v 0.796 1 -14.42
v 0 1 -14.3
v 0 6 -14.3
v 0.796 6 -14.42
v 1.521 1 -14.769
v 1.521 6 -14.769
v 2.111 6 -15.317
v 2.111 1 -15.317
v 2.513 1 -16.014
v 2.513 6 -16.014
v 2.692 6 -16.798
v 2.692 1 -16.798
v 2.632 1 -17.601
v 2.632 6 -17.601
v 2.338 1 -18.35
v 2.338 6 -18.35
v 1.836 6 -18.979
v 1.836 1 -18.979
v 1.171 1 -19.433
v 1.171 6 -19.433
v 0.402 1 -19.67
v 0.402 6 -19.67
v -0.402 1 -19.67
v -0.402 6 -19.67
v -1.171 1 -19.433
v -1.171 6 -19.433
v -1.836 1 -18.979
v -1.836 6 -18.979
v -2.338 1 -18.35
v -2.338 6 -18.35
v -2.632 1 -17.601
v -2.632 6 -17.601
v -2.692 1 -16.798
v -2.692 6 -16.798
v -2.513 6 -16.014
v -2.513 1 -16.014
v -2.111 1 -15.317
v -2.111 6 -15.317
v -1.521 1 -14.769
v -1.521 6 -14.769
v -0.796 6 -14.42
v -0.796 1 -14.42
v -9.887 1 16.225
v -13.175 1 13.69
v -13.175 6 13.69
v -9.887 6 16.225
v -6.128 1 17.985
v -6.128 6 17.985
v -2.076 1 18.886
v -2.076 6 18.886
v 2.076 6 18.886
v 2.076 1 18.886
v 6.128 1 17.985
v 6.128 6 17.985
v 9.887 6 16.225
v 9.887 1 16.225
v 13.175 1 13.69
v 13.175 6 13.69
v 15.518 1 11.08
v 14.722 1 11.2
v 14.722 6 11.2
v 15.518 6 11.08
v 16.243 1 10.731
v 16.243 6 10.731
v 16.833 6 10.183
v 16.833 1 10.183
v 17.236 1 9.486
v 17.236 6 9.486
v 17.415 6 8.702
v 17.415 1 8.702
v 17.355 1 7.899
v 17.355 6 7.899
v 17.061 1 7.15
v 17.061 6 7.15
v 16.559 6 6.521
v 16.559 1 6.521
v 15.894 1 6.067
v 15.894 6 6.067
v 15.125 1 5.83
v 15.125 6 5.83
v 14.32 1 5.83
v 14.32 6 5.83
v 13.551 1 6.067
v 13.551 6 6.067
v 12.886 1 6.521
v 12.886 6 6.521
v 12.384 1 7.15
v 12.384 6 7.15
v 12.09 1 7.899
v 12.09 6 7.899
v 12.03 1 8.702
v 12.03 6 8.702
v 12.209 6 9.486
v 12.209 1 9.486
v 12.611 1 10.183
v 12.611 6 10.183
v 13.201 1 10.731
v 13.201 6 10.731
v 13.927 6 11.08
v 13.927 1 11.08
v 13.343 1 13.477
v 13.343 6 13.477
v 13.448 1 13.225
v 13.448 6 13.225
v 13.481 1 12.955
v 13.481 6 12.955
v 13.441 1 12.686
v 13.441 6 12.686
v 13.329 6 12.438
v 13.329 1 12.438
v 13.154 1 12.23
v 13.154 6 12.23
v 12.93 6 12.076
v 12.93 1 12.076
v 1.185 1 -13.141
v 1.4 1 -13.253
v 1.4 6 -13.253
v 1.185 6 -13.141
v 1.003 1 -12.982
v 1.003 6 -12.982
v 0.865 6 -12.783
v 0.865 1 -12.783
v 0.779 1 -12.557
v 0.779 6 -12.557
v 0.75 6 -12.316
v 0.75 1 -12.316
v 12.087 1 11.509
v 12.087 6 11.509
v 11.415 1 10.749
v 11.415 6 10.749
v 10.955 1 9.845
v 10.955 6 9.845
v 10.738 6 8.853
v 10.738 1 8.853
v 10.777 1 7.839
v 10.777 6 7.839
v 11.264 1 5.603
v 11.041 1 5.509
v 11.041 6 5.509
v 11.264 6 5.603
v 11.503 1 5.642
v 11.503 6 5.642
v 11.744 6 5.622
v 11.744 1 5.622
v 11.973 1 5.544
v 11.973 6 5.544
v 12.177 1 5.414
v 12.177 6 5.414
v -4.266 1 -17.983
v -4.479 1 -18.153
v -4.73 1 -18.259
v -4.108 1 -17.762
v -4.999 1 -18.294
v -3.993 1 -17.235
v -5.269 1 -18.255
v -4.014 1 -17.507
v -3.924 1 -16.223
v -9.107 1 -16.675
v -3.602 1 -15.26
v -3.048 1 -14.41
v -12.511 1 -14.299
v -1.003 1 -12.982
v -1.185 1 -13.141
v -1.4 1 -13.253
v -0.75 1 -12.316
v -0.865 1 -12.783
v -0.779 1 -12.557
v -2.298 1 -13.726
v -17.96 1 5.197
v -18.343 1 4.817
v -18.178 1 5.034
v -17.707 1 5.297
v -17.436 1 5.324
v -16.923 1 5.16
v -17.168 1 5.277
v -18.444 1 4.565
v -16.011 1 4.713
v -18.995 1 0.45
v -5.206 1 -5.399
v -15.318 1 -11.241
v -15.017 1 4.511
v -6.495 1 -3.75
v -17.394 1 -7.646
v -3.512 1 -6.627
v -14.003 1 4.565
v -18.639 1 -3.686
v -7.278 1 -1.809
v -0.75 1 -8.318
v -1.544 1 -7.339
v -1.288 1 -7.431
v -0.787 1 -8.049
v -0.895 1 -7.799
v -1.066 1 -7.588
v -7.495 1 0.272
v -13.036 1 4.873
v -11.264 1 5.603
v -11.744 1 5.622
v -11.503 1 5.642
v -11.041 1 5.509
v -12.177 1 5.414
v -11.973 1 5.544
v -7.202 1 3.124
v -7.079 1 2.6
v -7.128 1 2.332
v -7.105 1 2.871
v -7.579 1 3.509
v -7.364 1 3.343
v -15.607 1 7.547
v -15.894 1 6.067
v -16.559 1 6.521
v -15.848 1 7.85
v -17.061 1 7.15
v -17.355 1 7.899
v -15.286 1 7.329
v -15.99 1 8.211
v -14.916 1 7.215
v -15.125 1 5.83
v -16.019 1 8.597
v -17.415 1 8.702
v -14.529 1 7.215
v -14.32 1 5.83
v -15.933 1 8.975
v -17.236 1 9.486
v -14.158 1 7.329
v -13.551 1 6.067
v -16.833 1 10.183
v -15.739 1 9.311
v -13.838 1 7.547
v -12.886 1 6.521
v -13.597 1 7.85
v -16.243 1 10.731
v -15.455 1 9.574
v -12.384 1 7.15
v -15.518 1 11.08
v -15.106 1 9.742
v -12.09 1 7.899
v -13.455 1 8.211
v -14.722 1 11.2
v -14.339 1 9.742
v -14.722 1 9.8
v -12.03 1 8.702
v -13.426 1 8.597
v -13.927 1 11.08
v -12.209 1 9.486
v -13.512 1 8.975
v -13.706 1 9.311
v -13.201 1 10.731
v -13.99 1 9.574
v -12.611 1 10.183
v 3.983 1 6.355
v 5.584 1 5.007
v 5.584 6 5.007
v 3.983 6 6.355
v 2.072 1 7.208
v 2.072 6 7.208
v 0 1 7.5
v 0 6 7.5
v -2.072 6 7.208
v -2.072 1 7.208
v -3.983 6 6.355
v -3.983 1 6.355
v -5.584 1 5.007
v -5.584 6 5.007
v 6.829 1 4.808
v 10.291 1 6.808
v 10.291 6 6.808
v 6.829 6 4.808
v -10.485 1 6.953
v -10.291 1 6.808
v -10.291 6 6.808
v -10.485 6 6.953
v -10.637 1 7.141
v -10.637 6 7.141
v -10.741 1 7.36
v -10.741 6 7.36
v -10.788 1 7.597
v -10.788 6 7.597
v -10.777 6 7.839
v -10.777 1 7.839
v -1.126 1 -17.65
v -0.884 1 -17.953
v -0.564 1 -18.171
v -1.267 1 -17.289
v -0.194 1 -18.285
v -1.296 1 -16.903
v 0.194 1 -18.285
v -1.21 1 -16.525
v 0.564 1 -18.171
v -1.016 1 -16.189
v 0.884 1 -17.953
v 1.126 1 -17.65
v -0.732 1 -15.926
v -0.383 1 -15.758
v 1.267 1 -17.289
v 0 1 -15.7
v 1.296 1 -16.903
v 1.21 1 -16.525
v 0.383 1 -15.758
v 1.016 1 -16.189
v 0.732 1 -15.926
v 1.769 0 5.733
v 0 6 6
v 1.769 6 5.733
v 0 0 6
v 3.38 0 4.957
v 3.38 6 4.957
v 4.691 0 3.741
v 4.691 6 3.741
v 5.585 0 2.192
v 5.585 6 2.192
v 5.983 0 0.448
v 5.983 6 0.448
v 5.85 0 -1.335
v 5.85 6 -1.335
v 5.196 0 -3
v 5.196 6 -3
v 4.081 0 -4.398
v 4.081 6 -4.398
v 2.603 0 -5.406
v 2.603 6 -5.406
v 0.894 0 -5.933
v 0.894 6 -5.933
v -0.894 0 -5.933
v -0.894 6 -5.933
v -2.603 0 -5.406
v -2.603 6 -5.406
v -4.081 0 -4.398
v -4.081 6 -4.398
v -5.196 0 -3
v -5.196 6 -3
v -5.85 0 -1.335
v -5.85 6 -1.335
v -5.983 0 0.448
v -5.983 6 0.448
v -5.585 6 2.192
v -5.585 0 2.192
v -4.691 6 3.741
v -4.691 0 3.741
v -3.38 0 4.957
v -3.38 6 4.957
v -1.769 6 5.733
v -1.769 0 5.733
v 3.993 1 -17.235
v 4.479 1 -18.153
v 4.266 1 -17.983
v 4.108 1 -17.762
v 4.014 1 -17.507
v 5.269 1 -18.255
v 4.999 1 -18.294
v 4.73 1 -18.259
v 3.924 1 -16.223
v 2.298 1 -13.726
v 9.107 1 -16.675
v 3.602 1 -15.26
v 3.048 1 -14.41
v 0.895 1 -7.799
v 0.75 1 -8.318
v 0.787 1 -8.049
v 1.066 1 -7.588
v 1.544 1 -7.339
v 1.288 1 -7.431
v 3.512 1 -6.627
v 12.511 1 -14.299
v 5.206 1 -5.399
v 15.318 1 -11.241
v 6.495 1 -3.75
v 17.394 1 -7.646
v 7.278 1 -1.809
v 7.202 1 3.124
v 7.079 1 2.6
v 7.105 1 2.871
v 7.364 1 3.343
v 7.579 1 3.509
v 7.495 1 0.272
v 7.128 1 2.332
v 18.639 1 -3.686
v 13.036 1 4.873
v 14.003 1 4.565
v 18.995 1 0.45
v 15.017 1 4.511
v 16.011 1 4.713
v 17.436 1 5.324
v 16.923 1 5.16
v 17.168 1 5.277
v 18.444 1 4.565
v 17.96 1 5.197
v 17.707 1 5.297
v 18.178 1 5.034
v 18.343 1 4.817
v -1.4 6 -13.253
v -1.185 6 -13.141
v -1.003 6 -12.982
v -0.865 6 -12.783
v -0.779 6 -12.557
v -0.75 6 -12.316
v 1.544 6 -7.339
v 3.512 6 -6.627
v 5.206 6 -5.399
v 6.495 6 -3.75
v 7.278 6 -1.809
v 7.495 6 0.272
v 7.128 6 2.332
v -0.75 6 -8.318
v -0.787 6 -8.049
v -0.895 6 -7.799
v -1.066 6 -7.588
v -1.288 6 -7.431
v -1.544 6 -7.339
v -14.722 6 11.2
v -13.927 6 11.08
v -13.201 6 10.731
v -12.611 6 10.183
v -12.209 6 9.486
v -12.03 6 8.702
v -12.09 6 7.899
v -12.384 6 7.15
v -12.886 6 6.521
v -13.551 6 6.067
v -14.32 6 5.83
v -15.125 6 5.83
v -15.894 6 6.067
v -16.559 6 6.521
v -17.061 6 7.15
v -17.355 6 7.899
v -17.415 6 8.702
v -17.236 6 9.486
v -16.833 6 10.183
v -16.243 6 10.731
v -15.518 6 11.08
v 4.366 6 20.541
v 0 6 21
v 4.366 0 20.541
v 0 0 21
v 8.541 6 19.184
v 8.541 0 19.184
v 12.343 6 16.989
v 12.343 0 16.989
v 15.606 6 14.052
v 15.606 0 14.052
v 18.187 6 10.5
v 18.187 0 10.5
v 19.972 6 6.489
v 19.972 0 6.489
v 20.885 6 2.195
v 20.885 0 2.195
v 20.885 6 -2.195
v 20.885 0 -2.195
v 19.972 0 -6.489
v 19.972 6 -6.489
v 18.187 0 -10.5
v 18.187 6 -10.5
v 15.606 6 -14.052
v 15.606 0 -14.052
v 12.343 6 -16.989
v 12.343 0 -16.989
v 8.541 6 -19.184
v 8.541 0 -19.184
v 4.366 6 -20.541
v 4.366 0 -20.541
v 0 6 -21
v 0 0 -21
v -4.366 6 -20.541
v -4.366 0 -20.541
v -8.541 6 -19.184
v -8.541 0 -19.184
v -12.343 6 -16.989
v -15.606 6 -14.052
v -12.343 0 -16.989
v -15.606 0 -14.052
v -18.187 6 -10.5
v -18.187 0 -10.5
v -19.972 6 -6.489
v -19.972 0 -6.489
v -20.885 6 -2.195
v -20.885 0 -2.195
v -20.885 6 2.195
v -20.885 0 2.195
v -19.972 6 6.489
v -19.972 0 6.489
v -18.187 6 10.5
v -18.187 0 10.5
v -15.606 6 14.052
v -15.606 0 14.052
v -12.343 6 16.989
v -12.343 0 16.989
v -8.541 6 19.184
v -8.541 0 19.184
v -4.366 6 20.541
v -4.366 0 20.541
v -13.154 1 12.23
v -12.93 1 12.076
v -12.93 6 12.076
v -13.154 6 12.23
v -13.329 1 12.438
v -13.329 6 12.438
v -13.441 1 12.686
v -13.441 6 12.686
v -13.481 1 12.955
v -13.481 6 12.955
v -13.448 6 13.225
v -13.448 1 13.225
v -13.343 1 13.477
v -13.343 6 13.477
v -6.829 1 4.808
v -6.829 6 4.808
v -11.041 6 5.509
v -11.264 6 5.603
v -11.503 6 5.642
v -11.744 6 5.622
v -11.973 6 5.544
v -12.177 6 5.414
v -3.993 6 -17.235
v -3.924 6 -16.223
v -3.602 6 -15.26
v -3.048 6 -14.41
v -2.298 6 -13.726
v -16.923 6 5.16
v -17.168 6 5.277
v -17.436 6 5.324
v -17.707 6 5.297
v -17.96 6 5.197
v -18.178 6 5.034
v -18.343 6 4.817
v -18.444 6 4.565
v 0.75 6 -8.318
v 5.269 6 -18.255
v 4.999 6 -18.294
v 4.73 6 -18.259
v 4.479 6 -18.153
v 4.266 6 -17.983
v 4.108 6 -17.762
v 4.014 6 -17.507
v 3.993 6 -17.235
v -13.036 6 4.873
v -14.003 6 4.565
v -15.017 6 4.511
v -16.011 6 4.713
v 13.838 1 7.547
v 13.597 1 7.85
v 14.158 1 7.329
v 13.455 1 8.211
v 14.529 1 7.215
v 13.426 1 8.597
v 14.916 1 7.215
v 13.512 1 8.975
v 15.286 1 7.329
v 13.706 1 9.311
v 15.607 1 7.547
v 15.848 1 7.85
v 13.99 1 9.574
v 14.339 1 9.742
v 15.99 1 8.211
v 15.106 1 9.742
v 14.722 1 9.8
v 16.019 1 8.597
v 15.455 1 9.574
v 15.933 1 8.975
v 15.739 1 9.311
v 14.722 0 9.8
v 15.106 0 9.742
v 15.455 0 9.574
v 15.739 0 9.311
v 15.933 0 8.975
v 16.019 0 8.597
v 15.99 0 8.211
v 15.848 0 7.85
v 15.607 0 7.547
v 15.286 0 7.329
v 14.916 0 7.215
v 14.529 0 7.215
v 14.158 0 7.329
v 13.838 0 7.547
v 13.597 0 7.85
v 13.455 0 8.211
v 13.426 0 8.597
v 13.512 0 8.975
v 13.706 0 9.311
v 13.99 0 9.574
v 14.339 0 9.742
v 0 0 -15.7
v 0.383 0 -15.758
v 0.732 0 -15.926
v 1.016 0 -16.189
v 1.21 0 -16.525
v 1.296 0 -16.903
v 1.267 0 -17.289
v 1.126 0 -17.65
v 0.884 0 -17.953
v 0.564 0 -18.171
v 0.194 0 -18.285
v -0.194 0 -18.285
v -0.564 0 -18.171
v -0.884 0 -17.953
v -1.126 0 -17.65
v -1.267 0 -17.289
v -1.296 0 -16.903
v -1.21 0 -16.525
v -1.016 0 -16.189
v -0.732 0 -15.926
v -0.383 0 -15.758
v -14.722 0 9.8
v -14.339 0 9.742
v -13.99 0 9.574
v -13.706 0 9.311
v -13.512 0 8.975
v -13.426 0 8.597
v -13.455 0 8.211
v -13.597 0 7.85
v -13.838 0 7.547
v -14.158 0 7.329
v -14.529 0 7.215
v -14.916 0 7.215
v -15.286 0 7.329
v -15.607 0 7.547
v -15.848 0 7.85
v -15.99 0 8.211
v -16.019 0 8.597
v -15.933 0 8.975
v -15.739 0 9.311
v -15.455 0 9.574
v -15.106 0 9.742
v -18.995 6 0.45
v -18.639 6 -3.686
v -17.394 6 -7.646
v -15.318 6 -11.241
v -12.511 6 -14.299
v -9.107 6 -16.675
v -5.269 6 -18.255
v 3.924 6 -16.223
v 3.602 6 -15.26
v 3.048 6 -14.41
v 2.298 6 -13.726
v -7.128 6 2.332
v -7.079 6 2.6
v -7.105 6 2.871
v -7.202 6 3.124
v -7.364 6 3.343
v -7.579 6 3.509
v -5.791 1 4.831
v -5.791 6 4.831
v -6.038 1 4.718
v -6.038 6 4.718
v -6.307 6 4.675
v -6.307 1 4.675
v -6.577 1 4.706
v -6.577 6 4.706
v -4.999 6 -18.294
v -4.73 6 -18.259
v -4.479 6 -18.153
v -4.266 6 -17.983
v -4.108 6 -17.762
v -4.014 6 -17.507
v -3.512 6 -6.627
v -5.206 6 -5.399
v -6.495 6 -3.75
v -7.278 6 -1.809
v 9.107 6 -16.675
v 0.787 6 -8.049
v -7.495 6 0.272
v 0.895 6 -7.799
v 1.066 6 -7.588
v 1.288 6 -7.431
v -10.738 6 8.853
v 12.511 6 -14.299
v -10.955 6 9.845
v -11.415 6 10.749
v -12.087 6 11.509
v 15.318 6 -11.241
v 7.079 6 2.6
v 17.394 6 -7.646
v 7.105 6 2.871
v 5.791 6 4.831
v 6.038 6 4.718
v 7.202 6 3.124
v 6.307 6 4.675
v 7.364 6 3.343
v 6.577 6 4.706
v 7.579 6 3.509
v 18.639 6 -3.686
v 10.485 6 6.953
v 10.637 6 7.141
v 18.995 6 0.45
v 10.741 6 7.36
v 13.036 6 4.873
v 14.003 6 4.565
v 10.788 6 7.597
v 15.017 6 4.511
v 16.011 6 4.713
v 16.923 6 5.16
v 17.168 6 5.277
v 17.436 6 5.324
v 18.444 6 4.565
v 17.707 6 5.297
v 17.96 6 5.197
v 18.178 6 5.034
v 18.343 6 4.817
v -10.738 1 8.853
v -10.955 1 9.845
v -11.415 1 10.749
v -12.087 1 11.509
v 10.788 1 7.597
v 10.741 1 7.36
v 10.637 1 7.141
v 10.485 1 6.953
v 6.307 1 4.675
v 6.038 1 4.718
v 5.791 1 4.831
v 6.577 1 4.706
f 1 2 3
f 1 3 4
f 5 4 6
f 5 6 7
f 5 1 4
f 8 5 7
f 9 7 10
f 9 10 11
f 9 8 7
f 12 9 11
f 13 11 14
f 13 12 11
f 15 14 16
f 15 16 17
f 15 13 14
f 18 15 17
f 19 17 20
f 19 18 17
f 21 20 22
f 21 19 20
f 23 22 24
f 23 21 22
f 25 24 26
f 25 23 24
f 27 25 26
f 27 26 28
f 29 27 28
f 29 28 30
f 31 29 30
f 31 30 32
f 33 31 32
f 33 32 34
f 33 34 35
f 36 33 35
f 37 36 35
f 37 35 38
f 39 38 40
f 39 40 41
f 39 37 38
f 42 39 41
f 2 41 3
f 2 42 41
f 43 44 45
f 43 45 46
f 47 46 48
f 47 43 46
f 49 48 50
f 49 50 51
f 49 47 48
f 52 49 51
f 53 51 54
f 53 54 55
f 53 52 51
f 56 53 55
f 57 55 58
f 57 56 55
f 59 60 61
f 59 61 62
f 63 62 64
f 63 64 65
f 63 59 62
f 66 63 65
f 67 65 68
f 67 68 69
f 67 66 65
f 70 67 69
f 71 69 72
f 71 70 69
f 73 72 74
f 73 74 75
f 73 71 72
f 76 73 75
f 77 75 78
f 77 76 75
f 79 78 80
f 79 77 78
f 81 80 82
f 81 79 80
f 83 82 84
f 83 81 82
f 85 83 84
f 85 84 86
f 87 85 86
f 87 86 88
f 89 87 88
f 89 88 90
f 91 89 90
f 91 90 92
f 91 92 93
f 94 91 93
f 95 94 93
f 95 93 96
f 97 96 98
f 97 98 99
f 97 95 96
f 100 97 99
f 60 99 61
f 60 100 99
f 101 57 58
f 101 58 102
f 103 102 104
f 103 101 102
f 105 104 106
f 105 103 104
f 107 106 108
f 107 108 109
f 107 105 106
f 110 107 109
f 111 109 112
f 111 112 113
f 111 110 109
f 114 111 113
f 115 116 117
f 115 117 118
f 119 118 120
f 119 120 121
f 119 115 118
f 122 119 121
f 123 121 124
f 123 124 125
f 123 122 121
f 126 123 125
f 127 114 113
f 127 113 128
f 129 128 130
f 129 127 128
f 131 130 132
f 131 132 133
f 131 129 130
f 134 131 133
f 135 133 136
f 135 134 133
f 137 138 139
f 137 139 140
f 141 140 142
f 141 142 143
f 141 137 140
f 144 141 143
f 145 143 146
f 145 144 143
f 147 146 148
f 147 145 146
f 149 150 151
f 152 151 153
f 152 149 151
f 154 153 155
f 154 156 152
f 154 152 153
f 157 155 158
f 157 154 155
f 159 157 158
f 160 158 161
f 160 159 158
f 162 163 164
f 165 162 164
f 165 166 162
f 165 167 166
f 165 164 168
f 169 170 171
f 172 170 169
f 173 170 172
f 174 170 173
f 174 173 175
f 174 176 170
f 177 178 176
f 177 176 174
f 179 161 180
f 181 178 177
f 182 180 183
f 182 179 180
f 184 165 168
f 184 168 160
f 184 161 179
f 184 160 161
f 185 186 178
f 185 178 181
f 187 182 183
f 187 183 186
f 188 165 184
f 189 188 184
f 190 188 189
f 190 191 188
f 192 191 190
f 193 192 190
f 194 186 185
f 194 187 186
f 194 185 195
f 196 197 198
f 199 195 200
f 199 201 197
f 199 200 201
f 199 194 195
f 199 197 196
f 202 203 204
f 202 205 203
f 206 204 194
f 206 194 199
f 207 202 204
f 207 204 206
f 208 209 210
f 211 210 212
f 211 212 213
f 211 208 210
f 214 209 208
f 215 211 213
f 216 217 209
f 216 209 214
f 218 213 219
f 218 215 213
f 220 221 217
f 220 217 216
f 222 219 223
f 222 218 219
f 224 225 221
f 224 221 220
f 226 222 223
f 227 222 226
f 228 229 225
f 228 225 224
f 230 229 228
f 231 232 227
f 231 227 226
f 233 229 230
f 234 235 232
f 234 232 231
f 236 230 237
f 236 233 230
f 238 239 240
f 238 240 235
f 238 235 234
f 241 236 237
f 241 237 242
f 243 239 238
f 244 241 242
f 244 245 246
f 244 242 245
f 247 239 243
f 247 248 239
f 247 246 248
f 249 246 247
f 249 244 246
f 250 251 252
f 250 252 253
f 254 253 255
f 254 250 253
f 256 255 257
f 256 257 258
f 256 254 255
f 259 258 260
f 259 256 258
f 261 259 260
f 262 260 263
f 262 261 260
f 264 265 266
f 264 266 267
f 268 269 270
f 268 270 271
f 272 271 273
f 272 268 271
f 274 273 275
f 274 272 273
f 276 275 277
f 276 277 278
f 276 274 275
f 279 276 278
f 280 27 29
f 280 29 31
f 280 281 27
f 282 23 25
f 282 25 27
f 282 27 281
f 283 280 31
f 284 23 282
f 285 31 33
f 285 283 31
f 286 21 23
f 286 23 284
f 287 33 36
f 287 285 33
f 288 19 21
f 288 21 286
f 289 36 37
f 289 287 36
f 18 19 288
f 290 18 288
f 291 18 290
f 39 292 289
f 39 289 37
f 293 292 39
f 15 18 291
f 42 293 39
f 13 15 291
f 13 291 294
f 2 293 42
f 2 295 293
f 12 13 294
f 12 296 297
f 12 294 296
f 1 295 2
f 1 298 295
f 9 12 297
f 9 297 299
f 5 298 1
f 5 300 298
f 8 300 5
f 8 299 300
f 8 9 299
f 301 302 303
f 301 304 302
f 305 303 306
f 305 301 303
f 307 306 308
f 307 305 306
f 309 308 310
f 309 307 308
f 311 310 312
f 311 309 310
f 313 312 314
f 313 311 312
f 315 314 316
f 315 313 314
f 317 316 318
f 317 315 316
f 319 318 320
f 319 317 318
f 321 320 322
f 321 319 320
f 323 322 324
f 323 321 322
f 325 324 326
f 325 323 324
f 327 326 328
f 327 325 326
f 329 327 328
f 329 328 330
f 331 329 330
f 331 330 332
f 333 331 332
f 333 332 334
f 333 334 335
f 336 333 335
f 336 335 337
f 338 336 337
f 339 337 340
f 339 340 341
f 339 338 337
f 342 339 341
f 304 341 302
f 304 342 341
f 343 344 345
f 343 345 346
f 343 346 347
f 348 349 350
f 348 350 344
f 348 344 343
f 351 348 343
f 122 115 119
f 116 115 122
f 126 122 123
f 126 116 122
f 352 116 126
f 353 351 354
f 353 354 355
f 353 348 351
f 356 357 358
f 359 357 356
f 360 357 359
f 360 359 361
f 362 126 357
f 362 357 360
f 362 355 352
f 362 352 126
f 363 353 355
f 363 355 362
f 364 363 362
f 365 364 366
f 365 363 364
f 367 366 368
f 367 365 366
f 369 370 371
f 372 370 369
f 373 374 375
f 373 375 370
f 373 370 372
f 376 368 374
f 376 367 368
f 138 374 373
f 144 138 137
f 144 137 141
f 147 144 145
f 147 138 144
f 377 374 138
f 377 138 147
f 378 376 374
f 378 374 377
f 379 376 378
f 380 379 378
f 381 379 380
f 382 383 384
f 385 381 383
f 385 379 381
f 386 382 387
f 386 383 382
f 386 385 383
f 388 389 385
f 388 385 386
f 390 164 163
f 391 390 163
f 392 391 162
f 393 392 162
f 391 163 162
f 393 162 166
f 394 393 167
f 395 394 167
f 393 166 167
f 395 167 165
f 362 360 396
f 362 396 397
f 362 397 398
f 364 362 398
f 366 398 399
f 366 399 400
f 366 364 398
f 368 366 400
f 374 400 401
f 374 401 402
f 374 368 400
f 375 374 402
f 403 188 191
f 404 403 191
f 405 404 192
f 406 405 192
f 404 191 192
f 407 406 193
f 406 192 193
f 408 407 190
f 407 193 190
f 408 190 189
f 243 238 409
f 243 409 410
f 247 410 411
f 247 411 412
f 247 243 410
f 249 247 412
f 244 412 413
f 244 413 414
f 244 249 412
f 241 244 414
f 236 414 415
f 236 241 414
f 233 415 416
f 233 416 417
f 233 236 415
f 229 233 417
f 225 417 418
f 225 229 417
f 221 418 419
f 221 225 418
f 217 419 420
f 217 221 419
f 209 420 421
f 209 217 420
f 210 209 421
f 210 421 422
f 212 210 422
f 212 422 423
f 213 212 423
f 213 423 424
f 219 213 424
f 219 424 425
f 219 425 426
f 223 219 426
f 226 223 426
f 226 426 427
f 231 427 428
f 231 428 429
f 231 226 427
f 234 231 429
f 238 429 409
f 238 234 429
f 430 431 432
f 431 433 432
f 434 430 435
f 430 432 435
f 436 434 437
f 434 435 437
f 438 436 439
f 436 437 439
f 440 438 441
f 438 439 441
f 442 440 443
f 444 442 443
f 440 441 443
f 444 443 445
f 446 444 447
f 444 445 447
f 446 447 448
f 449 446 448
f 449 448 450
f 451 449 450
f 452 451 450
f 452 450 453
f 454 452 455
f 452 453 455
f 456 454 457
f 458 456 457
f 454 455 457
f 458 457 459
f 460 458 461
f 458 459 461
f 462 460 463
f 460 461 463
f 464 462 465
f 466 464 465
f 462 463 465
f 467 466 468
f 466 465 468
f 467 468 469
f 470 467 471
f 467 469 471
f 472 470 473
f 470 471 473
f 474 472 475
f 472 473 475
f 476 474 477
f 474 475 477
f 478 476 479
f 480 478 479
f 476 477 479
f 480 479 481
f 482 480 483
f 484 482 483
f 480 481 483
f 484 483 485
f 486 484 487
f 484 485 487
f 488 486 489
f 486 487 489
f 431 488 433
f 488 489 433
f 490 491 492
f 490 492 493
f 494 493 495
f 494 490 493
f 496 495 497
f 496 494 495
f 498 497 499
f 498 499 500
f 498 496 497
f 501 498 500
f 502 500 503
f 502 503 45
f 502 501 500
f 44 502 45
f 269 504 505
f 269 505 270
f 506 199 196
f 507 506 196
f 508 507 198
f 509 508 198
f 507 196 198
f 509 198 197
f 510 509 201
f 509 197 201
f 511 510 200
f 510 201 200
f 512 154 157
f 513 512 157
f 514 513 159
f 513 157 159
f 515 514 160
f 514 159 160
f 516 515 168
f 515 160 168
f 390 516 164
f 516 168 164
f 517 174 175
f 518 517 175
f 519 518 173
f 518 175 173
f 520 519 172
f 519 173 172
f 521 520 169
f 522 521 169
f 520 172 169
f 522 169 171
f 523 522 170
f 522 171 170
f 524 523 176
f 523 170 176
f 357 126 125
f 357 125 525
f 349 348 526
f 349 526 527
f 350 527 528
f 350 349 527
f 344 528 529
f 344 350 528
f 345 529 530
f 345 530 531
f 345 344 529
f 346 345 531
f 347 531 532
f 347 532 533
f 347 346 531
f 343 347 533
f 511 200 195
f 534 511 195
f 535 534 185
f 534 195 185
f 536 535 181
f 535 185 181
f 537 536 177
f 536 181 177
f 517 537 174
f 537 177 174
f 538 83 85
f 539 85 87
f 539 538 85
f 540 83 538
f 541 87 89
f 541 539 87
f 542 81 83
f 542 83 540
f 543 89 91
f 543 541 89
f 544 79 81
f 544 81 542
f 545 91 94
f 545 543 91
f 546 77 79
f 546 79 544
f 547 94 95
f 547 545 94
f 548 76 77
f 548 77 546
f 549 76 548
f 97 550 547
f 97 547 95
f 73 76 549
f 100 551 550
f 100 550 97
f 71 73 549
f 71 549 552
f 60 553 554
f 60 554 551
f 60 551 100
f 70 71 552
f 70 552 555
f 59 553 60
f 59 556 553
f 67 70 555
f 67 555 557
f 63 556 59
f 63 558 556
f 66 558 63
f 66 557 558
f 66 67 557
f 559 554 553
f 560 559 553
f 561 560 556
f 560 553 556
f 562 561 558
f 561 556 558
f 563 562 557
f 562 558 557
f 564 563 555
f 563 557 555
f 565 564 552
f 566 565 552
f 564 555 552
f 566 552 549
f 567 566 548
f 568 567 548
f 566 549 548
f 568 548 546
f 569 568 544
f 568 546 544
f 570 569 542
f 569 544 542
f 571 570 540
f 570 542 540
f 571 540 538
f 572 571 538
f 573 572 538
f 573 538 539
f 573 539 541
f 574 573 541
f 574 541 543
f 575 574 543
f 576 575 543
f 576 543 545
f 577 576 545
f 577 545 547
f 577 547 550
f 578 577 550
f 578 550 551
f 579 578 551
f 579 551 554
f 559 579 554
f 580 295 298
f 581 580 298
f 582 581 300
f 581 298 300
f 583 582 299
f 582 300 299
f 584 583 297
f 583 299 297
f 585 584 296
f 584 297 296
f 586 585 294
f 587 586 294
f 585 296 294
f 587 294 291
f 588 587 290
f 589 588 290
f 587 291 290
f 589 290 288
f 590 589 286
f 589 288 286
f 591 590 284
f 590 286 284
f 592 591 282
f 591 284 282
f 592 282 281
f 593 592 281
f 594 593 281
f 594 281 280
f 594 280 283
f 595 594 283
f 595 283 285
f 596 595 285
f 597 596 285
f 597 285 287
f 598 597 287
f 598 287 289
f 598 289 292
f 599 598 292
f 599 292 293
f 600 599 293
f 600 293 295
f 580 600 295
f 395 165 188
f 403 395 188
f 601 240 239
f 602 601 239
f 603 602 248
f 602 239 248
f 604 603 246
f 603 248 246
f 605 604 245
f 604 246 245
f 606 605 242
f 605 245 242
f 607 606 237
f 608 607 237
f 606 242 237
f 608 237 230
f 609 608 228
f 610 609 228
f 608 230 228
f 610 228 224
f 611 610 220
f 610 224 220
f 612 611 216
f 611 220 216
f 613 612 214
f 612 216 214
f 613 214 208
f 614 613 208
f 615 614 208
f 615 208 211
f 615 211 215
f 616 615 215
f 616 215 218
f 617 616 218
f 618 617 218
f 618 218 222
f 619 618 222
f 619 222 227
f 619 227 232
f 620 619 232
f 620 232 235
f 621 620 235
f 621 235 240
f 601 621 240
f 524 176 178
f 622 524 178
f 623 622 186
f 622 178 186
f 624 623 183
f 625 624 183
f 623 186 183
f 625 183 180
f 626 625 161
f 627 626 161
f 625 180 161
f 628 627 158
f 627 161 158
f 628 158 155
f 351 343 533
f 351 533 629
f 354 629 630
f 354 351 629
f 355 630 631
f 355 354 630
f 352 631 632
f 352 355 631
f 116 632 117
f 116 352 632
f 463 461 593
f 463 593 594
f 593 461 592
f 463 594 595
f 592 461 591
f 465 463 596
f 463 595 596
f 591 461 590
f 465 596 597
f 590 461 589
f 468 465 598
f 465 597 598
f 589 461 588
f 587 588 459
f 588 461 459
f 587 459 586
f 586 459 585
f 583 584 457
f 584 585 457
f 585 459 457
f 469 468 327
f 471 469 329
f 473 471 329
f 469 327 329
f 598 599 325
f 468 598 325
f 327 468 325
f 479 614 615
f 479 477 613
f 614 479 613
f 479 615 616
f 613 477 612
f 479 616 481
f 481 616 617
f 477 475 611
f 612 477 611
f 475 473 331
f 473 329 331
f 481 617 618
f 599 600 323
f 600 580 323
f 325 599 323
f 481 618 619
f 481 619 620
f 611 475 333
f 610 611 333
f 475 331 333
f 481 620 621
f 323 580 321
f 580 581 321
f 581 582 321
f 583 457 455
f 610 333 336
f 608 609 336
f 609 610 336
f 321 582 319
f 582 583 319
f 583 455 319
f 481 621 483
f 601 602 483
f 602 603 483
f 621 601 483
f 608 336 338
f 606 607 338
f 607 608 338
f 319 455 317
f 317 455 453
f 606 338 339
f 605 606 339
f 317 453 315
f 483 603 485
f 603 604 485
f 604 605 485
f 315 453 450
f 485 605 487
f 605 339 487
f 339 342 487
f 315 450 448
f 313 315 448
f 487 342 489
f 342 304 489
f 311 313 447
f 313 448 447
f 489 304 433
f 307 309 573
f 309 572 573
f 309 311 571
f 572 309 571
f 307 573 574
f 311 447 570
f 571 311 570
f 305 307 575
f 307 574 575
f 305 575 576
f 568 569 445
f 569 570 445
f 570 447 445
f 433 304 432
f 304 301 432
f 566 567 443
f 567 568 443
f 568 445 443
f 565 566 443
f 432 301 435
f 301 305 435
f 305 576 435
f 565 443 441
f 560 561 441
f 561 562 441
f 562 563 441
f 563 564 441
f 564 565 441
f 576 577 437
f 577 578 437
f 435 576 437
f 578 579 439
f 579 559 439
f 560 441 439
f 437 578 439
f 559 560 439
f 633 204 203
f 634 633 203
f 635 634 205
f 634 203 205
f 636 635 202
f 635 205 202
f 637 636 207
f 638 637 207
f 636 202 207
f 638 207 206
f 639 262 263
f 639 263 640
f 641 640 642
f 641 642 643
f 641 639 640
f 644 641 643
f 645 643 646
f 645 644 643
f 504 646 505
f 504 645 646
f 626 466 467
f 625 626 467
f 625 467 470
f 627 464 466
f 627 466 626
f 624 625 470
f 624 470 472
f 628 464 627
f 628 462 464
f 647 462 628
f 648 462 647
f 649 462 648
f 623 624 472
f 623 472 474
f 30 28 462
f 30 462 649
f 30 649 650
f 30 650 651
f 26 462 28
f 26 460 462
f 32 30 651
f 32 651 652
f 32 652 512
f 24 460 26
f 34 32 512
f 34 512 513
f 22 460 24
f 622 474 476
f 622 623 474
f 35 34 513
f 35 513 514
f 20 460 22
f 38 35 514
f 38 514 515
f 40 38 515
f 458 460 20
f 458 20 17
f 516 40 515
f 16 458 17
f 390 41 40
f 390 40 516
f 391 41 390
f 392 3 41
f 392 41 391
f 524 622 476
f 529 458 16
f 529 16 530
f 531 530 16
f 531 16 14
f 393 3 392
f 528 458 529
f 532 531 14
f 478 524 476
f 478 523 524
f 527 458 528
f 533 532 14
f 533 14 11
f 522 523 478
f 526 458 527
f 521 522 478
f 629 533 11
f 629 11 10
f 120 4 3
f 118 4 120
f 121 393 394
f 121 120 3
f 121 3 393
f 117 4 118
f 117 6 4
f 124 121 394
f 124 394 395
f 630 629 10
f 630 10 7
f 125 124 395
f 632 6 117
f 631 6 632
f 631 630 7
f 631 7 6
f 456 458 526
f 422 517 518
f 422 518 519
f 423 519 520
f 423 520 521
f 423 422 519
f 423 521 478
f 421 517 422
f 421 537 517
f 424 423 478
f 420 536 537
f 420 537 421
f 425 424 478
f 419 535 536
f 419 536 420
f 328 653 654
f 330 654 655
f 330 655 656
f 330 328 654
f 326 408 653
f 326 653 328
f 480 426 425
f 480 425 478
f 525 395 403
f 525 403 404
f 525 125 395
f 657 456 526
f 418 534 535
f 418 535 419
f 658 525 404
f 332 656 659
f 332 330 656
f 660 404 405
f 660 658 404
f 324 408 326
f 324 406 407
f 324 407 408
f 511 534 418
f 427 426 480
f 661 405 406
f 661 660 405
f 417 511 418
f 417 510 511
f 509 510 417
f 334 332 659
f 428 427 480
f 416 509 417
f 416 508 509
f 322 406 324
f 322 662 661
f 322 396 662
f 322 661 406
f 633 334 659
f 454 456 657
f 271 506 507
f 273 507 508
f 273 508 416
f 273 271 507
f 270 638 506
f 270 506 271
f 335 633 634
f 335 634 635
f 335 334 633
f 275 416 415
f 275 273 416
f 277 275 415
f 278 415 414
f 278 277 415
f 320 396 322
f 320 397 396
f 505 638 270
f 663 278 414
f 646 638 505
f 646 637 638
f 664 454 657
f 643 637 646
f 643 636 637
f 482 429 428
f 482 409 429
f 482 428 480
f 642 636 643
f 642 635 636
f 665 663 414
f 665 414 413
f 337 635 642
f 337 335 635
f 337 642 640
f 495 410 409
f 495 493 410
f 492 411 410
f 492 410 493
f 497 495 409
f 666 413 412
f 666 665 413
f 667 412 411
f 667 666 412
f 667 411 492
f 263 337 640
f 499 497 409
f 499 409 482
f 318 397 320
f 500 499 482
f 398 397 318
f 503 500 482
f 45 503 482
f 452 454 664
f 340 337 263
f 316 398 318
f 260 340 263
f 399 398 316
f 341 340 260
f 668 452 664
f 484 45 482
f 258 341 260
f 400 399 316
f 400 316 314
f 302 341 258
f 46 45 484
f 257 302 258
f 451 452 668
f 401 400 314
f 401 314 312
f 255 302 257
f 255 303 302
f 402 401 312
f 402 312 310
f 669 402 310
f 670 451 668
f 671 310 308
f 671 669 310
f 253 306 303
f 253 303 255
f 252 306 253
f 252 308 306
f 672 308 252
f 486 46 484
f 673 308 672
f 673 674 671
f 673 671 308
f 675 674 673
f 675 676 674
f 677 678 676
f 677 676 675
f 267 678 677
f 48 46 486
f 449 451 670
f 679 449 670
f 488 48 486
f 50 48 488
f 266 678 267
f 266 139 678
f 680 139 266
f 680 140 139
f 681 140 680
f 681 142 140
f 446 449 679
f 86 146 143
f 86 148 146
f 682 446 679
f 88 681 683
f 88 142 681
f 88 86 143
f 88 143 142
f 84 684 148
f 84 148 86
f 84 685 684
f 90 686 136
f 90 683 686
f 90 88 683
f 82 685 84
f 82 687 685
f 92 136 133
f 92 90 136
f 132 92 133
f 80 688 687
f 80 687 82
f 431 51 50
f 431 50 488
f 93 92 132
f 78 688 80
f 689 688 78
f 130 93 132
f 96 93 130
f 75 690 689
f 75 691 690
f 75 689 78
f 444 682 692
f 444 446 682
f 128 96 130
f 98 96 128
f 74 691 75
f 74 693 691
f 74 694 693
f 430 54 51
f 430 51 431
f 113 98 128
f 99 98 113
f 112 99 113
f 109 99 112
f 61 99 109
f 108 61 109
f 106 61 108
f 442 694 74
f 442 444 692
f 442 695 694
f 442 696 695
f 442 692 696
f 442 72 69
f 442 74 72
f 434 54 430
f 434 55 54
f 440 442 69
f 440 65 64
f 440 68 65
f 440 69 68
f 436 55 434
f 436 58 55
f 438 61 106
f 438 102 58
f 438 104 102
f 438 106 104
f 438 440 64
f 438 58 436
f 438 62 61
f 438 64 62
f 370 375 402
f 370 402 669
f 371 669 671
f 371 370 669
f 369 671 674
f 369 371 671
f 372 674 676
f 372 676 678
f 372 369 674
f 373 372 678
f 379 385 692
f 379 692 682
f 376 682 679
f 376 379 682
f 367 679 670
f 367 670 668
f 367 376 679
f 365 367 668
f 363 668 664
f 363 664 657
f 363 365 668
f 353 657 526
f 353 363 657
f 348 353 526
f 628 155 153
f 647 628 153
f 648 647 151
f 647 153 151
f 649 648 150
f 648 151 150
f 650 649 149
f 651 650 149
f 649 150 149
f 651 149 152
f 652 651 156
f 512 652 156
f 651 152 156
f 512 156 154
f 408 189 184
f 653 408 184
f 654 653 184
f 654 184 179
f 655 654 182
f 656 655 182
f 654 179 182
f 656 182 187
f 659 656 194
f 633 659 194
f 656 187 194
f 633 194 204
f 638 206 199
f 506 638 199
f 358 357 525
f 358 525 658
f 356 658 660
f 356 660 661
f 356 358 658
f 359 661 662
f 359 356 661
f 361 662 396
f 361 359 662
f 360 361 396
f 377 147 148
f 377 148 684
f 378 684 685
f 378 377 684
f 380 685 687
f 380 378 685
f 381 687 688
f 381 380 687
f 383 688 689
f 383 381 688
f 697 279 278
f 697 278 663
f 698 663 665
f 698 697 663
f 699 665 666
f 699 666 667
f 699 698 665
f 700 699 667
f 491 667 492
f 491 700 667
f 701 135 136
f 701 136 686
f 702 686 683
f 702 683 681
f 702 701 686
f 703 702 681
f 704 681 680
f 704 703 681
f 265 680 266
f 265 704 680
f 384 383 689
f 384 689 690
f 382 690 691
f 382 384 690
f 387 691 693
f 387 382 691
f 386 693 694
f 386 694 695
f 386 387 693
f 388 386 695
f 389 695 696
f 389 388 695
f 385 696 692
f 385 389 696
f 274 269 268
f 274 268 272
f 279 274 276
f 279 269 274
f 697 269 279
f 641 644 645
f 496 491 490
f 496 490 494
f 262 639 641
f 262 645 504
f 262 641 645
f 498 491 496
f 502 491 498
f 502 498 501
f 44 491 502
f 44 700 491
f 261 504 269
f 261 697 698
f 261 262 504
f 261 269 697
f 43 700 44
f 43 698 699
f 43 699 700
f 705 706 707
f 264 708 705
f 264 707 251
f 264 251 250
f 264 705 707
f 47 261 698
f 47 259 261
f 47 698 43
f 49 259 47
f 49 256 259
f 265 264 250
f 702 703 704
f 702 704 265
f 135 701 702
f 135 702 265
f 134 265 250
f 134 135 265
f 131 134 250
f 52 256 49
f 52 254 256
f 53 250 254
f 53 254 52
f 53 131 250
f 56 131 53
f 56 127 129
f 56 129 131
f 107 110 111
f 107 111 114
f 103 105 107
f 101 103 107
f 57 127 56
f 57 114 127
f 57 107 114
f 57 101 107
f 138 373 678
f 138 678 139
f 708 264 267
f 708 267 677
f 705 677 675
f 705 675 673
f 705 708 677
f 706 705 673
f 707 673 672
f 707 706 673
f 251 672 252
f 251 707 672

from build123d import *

# Parameters (mm, degrees)
SKETCH1_R           = 21
SKETCH1_R_2         = 6
BOSS_EXTRUDE1_DEPTH = 1
SKETCH2_R           = 21
SKETCH2_R_2         = 2.7
SKETCH2_R_3         = 6
BOSS_EXTRUDE2_DEPTH = 5
SKETCH3_R           = 1.3
CUT_EXTRUDE1_DEPTH  = 4


with BuildPart() as part:
    # Sketch1 → Boss-Extrude1 (new body)
    with BuildSketch(Plane(origin=(0, 0, 0), x_dir=(1, 0, 0), z_dir=(0, 1, 0))):
        with Locations(Location((0, 0, 0), (0, 0, 270))):
            Circle(SKETCH1_R)
        with Locations(Location((0, 0, 0), (0, 0, 270))):
            Circle(SKETCH1_R_2, mode=Mode.SUBTRACT)
    extrude(amount=BOSS_EXTRUDE1_DEPTH)

    # Sketch2 → Boss-Extrude2 (add)
    with BuildSketch(Plane(origin=(0, 1, 0), x_dir=(1, 0, 0), z_dir=(0, 1, 0))):
        with Locations(Location((0, 0, 0), (0, 0, 270))):
            Circle(SKETCH2_R)
        with Locations(Location((0, 17, 0), (0, 0, 270))):
            Circle(SKETCH2_R_2, mode=Mode.SUBTRACT)
        with Locations(Location((14.722431864, -8.5, 0), (0, 0, 270))):
            Circle(SKETCH2_R_2, mode=Mode.SUBTRACT)
        with Locations(Location((-14.722431864, -8.5, 0), (0, 0, 270))):
            Circle(SKETCH2_R_2, mode=Mode.SUBTRACT)
        with Locations(Location((0, 0, 0), (0, 0, 270))):
            Circle(SKETCH2_R_3, mode=Mode.SUBTRACT)
        with BuildLine():
            Line((-0.75, 12.316251501), (-0.75, 8.31790238))
            ThreePointArc((-0.75, 8.31790238), (-0.97350713, 7.687776342), (-1.544117647, 7.339325629))
            ThreePointArc((-1.544117647, 7.339325629), (-6.495190528, 3.75), (-7.128101265, -2.332417706))
            ThreePointArc((-7.128101265, -2.332417706), (-7.144563176, -3.000806265), (-7.578514767, -3.509432137))
            Line((-7.578514767, -3.509432137), (-11.041186679, -5.508606698))
            ThreePointArc((-11.041186679, -5.508606698), (-11.624105203, -5.639137624), (-12.177435716, -5.414065035))
            ThreePointArc((-12.177435716, -5.414065035), (-14.508194092, -4.505741348), (-16.922739342, -5.159543893))
            ThreePointArc((-16.922739342, -5.159543893), (-17.83709693, -5.255719057), (-18.443528223, -4.564675969))
            ThreePointArc((-18.443528223, -4.564675969), (-16.454482672, 9.5), (-5.268638762, 18.254901961))
            ThreePointArc((-5.268638762, 18.254901961), (-4.366962246, 18.075238599), (-3.993073588, 17.235294118))
            ThreePointArc((-3.993073588, 17.235294118), (-3.352010576, 14.817335321), (-1.4, 13.253001201))
            ThreePointArc((-1.4, 13.253001201), (-0.928416164, 12.886339214), (-0.75, 12.316251501))
        make_face(mode=Mode.SUBTRACT)
        with BuildLine():
            Line((0.75, 12.316251501), (0.75, 8.31790238))
            ThreePointArc((0.75, 8.31790238), (0.97350713, 7.687776342), (1.544117647, 7.339325629))
            ThreePointArc((1.544117647, 7.339325629), (6.495190528, 3.75), (7.128101265, -2.332417706))
            ThreePointArc((7.128101265, -2.332417706), (7.144563176, -3.000806265), (7.578514767, -3.509432137))
            Line((7.578514767, -3.509432137), (11.041186679, -5.508606698))
            ThreePointArc((11.041186679, -5.508606698), (11.624105203, -5.639137624), (12.177435716, -5.414065035))
            ThreePointArc((12.177435716, -5.414065035), (14.508194092, -4.505741348), (16.922739342, -5.159543893))
            ThreePointArc((16.922739342, -5.159543893), (17.83709693, -5.255719057), (18.443528223, -4.564675969))
            ThreePointArc((18.443528223, -4.564675969), (16.454482672, 9.5), (5.268638762, 18.254901961))
            ThreePointArc((5.268638762, 18.254901961), (4.366962246, 18.075238599), (3.993073588, 17.235294118))
            ThreePointArc((3.993073588, 17.235294118), (3.352010576, 14.817335321), (1.4, 13.253001201))
            ThreePointArc((1.4, 13.253001201), (0.928416164, 12.886339214), (0.75, 12.316251501))
        make_face(mode=Mode.SUBTRACT)
        with BuildLine():
            Line((10.291186679, -6.807644803), (6.828514767, -4.808470243))
            ThreePointArc((6.828514767, -4.808470243), (6.171056046, -4.686970077), (5.583983618, -5.006907923))
            ThreePointArc((5.583983618, -5.006907923), (0, -7.5), (-5.583983618, -5.006907923))
            ThreePointArc((-5.583983618, -5.006907923), (-6.171056046, -4.686970077), (-6.828514767, -4.808470243))
            Line((-6.828514767, -4.808470243), (-10.291186679, -6.807644803))
            ThreePointArc((-10.291186679, -6.807644803), (-10.695689039, -7.24720159), (-10.777435716, -7.838936166))
            ThreePointArc((-10.777435716, -7.838936166), (-11.156183517, -10.311593973), (-12.929665754, -12.075750225))
            ThreePointArc((-12.929665754, -12.075750225), (-13.470134683, -12.819519543), (-13.174889461, -13.690225991))
            ThreePointArc((-13.174889461, -13.690225991), (0, -19), (13.174889461, -13.690225991))
            ThreePointArc((13.174889461, -13.690225991), (13.470134683, -12.819519543), (12.929665754, -12.075750225))
            ThreePointArc((12.929665754, -12.075750225), (11.156183517, -10.311593973), (10.777435716, -7.838936166))
            ThreePointArc((10.777435716, -7.838936166), (10.695689039, -7.24720159), (10.291186679, -6.807644803))
        make_face(mode=Mode.SUBTRACT)
    extrude(amount=BOSS_EXTRUDE2_DEPTH)

    # Sketch3 → Cut-Extrude1 (cut)
    with BuildSketch(Plane(origin=(0, 1, 0), x_dir=(1, 0, 0), z_dir=(0, 1, 0))):
        with Locations(Location((-14.722431864, -8.5, 0), (0, 0, 270))):
            Circle(SKETCH3_R)
        with Locations(Location((14.722431864, -8.5, 0), (0, 0, 270))):
            Circle(SKETCH3_R)
        with Locations(Location((0, 17, 0), (0, 0, 270))):
            Circle(SKETCH3_R)
    extrude(amount=-CUT_EXTRUDE1_DEPTH, mode=Mode.SUBTRACT)


solid = part.part
